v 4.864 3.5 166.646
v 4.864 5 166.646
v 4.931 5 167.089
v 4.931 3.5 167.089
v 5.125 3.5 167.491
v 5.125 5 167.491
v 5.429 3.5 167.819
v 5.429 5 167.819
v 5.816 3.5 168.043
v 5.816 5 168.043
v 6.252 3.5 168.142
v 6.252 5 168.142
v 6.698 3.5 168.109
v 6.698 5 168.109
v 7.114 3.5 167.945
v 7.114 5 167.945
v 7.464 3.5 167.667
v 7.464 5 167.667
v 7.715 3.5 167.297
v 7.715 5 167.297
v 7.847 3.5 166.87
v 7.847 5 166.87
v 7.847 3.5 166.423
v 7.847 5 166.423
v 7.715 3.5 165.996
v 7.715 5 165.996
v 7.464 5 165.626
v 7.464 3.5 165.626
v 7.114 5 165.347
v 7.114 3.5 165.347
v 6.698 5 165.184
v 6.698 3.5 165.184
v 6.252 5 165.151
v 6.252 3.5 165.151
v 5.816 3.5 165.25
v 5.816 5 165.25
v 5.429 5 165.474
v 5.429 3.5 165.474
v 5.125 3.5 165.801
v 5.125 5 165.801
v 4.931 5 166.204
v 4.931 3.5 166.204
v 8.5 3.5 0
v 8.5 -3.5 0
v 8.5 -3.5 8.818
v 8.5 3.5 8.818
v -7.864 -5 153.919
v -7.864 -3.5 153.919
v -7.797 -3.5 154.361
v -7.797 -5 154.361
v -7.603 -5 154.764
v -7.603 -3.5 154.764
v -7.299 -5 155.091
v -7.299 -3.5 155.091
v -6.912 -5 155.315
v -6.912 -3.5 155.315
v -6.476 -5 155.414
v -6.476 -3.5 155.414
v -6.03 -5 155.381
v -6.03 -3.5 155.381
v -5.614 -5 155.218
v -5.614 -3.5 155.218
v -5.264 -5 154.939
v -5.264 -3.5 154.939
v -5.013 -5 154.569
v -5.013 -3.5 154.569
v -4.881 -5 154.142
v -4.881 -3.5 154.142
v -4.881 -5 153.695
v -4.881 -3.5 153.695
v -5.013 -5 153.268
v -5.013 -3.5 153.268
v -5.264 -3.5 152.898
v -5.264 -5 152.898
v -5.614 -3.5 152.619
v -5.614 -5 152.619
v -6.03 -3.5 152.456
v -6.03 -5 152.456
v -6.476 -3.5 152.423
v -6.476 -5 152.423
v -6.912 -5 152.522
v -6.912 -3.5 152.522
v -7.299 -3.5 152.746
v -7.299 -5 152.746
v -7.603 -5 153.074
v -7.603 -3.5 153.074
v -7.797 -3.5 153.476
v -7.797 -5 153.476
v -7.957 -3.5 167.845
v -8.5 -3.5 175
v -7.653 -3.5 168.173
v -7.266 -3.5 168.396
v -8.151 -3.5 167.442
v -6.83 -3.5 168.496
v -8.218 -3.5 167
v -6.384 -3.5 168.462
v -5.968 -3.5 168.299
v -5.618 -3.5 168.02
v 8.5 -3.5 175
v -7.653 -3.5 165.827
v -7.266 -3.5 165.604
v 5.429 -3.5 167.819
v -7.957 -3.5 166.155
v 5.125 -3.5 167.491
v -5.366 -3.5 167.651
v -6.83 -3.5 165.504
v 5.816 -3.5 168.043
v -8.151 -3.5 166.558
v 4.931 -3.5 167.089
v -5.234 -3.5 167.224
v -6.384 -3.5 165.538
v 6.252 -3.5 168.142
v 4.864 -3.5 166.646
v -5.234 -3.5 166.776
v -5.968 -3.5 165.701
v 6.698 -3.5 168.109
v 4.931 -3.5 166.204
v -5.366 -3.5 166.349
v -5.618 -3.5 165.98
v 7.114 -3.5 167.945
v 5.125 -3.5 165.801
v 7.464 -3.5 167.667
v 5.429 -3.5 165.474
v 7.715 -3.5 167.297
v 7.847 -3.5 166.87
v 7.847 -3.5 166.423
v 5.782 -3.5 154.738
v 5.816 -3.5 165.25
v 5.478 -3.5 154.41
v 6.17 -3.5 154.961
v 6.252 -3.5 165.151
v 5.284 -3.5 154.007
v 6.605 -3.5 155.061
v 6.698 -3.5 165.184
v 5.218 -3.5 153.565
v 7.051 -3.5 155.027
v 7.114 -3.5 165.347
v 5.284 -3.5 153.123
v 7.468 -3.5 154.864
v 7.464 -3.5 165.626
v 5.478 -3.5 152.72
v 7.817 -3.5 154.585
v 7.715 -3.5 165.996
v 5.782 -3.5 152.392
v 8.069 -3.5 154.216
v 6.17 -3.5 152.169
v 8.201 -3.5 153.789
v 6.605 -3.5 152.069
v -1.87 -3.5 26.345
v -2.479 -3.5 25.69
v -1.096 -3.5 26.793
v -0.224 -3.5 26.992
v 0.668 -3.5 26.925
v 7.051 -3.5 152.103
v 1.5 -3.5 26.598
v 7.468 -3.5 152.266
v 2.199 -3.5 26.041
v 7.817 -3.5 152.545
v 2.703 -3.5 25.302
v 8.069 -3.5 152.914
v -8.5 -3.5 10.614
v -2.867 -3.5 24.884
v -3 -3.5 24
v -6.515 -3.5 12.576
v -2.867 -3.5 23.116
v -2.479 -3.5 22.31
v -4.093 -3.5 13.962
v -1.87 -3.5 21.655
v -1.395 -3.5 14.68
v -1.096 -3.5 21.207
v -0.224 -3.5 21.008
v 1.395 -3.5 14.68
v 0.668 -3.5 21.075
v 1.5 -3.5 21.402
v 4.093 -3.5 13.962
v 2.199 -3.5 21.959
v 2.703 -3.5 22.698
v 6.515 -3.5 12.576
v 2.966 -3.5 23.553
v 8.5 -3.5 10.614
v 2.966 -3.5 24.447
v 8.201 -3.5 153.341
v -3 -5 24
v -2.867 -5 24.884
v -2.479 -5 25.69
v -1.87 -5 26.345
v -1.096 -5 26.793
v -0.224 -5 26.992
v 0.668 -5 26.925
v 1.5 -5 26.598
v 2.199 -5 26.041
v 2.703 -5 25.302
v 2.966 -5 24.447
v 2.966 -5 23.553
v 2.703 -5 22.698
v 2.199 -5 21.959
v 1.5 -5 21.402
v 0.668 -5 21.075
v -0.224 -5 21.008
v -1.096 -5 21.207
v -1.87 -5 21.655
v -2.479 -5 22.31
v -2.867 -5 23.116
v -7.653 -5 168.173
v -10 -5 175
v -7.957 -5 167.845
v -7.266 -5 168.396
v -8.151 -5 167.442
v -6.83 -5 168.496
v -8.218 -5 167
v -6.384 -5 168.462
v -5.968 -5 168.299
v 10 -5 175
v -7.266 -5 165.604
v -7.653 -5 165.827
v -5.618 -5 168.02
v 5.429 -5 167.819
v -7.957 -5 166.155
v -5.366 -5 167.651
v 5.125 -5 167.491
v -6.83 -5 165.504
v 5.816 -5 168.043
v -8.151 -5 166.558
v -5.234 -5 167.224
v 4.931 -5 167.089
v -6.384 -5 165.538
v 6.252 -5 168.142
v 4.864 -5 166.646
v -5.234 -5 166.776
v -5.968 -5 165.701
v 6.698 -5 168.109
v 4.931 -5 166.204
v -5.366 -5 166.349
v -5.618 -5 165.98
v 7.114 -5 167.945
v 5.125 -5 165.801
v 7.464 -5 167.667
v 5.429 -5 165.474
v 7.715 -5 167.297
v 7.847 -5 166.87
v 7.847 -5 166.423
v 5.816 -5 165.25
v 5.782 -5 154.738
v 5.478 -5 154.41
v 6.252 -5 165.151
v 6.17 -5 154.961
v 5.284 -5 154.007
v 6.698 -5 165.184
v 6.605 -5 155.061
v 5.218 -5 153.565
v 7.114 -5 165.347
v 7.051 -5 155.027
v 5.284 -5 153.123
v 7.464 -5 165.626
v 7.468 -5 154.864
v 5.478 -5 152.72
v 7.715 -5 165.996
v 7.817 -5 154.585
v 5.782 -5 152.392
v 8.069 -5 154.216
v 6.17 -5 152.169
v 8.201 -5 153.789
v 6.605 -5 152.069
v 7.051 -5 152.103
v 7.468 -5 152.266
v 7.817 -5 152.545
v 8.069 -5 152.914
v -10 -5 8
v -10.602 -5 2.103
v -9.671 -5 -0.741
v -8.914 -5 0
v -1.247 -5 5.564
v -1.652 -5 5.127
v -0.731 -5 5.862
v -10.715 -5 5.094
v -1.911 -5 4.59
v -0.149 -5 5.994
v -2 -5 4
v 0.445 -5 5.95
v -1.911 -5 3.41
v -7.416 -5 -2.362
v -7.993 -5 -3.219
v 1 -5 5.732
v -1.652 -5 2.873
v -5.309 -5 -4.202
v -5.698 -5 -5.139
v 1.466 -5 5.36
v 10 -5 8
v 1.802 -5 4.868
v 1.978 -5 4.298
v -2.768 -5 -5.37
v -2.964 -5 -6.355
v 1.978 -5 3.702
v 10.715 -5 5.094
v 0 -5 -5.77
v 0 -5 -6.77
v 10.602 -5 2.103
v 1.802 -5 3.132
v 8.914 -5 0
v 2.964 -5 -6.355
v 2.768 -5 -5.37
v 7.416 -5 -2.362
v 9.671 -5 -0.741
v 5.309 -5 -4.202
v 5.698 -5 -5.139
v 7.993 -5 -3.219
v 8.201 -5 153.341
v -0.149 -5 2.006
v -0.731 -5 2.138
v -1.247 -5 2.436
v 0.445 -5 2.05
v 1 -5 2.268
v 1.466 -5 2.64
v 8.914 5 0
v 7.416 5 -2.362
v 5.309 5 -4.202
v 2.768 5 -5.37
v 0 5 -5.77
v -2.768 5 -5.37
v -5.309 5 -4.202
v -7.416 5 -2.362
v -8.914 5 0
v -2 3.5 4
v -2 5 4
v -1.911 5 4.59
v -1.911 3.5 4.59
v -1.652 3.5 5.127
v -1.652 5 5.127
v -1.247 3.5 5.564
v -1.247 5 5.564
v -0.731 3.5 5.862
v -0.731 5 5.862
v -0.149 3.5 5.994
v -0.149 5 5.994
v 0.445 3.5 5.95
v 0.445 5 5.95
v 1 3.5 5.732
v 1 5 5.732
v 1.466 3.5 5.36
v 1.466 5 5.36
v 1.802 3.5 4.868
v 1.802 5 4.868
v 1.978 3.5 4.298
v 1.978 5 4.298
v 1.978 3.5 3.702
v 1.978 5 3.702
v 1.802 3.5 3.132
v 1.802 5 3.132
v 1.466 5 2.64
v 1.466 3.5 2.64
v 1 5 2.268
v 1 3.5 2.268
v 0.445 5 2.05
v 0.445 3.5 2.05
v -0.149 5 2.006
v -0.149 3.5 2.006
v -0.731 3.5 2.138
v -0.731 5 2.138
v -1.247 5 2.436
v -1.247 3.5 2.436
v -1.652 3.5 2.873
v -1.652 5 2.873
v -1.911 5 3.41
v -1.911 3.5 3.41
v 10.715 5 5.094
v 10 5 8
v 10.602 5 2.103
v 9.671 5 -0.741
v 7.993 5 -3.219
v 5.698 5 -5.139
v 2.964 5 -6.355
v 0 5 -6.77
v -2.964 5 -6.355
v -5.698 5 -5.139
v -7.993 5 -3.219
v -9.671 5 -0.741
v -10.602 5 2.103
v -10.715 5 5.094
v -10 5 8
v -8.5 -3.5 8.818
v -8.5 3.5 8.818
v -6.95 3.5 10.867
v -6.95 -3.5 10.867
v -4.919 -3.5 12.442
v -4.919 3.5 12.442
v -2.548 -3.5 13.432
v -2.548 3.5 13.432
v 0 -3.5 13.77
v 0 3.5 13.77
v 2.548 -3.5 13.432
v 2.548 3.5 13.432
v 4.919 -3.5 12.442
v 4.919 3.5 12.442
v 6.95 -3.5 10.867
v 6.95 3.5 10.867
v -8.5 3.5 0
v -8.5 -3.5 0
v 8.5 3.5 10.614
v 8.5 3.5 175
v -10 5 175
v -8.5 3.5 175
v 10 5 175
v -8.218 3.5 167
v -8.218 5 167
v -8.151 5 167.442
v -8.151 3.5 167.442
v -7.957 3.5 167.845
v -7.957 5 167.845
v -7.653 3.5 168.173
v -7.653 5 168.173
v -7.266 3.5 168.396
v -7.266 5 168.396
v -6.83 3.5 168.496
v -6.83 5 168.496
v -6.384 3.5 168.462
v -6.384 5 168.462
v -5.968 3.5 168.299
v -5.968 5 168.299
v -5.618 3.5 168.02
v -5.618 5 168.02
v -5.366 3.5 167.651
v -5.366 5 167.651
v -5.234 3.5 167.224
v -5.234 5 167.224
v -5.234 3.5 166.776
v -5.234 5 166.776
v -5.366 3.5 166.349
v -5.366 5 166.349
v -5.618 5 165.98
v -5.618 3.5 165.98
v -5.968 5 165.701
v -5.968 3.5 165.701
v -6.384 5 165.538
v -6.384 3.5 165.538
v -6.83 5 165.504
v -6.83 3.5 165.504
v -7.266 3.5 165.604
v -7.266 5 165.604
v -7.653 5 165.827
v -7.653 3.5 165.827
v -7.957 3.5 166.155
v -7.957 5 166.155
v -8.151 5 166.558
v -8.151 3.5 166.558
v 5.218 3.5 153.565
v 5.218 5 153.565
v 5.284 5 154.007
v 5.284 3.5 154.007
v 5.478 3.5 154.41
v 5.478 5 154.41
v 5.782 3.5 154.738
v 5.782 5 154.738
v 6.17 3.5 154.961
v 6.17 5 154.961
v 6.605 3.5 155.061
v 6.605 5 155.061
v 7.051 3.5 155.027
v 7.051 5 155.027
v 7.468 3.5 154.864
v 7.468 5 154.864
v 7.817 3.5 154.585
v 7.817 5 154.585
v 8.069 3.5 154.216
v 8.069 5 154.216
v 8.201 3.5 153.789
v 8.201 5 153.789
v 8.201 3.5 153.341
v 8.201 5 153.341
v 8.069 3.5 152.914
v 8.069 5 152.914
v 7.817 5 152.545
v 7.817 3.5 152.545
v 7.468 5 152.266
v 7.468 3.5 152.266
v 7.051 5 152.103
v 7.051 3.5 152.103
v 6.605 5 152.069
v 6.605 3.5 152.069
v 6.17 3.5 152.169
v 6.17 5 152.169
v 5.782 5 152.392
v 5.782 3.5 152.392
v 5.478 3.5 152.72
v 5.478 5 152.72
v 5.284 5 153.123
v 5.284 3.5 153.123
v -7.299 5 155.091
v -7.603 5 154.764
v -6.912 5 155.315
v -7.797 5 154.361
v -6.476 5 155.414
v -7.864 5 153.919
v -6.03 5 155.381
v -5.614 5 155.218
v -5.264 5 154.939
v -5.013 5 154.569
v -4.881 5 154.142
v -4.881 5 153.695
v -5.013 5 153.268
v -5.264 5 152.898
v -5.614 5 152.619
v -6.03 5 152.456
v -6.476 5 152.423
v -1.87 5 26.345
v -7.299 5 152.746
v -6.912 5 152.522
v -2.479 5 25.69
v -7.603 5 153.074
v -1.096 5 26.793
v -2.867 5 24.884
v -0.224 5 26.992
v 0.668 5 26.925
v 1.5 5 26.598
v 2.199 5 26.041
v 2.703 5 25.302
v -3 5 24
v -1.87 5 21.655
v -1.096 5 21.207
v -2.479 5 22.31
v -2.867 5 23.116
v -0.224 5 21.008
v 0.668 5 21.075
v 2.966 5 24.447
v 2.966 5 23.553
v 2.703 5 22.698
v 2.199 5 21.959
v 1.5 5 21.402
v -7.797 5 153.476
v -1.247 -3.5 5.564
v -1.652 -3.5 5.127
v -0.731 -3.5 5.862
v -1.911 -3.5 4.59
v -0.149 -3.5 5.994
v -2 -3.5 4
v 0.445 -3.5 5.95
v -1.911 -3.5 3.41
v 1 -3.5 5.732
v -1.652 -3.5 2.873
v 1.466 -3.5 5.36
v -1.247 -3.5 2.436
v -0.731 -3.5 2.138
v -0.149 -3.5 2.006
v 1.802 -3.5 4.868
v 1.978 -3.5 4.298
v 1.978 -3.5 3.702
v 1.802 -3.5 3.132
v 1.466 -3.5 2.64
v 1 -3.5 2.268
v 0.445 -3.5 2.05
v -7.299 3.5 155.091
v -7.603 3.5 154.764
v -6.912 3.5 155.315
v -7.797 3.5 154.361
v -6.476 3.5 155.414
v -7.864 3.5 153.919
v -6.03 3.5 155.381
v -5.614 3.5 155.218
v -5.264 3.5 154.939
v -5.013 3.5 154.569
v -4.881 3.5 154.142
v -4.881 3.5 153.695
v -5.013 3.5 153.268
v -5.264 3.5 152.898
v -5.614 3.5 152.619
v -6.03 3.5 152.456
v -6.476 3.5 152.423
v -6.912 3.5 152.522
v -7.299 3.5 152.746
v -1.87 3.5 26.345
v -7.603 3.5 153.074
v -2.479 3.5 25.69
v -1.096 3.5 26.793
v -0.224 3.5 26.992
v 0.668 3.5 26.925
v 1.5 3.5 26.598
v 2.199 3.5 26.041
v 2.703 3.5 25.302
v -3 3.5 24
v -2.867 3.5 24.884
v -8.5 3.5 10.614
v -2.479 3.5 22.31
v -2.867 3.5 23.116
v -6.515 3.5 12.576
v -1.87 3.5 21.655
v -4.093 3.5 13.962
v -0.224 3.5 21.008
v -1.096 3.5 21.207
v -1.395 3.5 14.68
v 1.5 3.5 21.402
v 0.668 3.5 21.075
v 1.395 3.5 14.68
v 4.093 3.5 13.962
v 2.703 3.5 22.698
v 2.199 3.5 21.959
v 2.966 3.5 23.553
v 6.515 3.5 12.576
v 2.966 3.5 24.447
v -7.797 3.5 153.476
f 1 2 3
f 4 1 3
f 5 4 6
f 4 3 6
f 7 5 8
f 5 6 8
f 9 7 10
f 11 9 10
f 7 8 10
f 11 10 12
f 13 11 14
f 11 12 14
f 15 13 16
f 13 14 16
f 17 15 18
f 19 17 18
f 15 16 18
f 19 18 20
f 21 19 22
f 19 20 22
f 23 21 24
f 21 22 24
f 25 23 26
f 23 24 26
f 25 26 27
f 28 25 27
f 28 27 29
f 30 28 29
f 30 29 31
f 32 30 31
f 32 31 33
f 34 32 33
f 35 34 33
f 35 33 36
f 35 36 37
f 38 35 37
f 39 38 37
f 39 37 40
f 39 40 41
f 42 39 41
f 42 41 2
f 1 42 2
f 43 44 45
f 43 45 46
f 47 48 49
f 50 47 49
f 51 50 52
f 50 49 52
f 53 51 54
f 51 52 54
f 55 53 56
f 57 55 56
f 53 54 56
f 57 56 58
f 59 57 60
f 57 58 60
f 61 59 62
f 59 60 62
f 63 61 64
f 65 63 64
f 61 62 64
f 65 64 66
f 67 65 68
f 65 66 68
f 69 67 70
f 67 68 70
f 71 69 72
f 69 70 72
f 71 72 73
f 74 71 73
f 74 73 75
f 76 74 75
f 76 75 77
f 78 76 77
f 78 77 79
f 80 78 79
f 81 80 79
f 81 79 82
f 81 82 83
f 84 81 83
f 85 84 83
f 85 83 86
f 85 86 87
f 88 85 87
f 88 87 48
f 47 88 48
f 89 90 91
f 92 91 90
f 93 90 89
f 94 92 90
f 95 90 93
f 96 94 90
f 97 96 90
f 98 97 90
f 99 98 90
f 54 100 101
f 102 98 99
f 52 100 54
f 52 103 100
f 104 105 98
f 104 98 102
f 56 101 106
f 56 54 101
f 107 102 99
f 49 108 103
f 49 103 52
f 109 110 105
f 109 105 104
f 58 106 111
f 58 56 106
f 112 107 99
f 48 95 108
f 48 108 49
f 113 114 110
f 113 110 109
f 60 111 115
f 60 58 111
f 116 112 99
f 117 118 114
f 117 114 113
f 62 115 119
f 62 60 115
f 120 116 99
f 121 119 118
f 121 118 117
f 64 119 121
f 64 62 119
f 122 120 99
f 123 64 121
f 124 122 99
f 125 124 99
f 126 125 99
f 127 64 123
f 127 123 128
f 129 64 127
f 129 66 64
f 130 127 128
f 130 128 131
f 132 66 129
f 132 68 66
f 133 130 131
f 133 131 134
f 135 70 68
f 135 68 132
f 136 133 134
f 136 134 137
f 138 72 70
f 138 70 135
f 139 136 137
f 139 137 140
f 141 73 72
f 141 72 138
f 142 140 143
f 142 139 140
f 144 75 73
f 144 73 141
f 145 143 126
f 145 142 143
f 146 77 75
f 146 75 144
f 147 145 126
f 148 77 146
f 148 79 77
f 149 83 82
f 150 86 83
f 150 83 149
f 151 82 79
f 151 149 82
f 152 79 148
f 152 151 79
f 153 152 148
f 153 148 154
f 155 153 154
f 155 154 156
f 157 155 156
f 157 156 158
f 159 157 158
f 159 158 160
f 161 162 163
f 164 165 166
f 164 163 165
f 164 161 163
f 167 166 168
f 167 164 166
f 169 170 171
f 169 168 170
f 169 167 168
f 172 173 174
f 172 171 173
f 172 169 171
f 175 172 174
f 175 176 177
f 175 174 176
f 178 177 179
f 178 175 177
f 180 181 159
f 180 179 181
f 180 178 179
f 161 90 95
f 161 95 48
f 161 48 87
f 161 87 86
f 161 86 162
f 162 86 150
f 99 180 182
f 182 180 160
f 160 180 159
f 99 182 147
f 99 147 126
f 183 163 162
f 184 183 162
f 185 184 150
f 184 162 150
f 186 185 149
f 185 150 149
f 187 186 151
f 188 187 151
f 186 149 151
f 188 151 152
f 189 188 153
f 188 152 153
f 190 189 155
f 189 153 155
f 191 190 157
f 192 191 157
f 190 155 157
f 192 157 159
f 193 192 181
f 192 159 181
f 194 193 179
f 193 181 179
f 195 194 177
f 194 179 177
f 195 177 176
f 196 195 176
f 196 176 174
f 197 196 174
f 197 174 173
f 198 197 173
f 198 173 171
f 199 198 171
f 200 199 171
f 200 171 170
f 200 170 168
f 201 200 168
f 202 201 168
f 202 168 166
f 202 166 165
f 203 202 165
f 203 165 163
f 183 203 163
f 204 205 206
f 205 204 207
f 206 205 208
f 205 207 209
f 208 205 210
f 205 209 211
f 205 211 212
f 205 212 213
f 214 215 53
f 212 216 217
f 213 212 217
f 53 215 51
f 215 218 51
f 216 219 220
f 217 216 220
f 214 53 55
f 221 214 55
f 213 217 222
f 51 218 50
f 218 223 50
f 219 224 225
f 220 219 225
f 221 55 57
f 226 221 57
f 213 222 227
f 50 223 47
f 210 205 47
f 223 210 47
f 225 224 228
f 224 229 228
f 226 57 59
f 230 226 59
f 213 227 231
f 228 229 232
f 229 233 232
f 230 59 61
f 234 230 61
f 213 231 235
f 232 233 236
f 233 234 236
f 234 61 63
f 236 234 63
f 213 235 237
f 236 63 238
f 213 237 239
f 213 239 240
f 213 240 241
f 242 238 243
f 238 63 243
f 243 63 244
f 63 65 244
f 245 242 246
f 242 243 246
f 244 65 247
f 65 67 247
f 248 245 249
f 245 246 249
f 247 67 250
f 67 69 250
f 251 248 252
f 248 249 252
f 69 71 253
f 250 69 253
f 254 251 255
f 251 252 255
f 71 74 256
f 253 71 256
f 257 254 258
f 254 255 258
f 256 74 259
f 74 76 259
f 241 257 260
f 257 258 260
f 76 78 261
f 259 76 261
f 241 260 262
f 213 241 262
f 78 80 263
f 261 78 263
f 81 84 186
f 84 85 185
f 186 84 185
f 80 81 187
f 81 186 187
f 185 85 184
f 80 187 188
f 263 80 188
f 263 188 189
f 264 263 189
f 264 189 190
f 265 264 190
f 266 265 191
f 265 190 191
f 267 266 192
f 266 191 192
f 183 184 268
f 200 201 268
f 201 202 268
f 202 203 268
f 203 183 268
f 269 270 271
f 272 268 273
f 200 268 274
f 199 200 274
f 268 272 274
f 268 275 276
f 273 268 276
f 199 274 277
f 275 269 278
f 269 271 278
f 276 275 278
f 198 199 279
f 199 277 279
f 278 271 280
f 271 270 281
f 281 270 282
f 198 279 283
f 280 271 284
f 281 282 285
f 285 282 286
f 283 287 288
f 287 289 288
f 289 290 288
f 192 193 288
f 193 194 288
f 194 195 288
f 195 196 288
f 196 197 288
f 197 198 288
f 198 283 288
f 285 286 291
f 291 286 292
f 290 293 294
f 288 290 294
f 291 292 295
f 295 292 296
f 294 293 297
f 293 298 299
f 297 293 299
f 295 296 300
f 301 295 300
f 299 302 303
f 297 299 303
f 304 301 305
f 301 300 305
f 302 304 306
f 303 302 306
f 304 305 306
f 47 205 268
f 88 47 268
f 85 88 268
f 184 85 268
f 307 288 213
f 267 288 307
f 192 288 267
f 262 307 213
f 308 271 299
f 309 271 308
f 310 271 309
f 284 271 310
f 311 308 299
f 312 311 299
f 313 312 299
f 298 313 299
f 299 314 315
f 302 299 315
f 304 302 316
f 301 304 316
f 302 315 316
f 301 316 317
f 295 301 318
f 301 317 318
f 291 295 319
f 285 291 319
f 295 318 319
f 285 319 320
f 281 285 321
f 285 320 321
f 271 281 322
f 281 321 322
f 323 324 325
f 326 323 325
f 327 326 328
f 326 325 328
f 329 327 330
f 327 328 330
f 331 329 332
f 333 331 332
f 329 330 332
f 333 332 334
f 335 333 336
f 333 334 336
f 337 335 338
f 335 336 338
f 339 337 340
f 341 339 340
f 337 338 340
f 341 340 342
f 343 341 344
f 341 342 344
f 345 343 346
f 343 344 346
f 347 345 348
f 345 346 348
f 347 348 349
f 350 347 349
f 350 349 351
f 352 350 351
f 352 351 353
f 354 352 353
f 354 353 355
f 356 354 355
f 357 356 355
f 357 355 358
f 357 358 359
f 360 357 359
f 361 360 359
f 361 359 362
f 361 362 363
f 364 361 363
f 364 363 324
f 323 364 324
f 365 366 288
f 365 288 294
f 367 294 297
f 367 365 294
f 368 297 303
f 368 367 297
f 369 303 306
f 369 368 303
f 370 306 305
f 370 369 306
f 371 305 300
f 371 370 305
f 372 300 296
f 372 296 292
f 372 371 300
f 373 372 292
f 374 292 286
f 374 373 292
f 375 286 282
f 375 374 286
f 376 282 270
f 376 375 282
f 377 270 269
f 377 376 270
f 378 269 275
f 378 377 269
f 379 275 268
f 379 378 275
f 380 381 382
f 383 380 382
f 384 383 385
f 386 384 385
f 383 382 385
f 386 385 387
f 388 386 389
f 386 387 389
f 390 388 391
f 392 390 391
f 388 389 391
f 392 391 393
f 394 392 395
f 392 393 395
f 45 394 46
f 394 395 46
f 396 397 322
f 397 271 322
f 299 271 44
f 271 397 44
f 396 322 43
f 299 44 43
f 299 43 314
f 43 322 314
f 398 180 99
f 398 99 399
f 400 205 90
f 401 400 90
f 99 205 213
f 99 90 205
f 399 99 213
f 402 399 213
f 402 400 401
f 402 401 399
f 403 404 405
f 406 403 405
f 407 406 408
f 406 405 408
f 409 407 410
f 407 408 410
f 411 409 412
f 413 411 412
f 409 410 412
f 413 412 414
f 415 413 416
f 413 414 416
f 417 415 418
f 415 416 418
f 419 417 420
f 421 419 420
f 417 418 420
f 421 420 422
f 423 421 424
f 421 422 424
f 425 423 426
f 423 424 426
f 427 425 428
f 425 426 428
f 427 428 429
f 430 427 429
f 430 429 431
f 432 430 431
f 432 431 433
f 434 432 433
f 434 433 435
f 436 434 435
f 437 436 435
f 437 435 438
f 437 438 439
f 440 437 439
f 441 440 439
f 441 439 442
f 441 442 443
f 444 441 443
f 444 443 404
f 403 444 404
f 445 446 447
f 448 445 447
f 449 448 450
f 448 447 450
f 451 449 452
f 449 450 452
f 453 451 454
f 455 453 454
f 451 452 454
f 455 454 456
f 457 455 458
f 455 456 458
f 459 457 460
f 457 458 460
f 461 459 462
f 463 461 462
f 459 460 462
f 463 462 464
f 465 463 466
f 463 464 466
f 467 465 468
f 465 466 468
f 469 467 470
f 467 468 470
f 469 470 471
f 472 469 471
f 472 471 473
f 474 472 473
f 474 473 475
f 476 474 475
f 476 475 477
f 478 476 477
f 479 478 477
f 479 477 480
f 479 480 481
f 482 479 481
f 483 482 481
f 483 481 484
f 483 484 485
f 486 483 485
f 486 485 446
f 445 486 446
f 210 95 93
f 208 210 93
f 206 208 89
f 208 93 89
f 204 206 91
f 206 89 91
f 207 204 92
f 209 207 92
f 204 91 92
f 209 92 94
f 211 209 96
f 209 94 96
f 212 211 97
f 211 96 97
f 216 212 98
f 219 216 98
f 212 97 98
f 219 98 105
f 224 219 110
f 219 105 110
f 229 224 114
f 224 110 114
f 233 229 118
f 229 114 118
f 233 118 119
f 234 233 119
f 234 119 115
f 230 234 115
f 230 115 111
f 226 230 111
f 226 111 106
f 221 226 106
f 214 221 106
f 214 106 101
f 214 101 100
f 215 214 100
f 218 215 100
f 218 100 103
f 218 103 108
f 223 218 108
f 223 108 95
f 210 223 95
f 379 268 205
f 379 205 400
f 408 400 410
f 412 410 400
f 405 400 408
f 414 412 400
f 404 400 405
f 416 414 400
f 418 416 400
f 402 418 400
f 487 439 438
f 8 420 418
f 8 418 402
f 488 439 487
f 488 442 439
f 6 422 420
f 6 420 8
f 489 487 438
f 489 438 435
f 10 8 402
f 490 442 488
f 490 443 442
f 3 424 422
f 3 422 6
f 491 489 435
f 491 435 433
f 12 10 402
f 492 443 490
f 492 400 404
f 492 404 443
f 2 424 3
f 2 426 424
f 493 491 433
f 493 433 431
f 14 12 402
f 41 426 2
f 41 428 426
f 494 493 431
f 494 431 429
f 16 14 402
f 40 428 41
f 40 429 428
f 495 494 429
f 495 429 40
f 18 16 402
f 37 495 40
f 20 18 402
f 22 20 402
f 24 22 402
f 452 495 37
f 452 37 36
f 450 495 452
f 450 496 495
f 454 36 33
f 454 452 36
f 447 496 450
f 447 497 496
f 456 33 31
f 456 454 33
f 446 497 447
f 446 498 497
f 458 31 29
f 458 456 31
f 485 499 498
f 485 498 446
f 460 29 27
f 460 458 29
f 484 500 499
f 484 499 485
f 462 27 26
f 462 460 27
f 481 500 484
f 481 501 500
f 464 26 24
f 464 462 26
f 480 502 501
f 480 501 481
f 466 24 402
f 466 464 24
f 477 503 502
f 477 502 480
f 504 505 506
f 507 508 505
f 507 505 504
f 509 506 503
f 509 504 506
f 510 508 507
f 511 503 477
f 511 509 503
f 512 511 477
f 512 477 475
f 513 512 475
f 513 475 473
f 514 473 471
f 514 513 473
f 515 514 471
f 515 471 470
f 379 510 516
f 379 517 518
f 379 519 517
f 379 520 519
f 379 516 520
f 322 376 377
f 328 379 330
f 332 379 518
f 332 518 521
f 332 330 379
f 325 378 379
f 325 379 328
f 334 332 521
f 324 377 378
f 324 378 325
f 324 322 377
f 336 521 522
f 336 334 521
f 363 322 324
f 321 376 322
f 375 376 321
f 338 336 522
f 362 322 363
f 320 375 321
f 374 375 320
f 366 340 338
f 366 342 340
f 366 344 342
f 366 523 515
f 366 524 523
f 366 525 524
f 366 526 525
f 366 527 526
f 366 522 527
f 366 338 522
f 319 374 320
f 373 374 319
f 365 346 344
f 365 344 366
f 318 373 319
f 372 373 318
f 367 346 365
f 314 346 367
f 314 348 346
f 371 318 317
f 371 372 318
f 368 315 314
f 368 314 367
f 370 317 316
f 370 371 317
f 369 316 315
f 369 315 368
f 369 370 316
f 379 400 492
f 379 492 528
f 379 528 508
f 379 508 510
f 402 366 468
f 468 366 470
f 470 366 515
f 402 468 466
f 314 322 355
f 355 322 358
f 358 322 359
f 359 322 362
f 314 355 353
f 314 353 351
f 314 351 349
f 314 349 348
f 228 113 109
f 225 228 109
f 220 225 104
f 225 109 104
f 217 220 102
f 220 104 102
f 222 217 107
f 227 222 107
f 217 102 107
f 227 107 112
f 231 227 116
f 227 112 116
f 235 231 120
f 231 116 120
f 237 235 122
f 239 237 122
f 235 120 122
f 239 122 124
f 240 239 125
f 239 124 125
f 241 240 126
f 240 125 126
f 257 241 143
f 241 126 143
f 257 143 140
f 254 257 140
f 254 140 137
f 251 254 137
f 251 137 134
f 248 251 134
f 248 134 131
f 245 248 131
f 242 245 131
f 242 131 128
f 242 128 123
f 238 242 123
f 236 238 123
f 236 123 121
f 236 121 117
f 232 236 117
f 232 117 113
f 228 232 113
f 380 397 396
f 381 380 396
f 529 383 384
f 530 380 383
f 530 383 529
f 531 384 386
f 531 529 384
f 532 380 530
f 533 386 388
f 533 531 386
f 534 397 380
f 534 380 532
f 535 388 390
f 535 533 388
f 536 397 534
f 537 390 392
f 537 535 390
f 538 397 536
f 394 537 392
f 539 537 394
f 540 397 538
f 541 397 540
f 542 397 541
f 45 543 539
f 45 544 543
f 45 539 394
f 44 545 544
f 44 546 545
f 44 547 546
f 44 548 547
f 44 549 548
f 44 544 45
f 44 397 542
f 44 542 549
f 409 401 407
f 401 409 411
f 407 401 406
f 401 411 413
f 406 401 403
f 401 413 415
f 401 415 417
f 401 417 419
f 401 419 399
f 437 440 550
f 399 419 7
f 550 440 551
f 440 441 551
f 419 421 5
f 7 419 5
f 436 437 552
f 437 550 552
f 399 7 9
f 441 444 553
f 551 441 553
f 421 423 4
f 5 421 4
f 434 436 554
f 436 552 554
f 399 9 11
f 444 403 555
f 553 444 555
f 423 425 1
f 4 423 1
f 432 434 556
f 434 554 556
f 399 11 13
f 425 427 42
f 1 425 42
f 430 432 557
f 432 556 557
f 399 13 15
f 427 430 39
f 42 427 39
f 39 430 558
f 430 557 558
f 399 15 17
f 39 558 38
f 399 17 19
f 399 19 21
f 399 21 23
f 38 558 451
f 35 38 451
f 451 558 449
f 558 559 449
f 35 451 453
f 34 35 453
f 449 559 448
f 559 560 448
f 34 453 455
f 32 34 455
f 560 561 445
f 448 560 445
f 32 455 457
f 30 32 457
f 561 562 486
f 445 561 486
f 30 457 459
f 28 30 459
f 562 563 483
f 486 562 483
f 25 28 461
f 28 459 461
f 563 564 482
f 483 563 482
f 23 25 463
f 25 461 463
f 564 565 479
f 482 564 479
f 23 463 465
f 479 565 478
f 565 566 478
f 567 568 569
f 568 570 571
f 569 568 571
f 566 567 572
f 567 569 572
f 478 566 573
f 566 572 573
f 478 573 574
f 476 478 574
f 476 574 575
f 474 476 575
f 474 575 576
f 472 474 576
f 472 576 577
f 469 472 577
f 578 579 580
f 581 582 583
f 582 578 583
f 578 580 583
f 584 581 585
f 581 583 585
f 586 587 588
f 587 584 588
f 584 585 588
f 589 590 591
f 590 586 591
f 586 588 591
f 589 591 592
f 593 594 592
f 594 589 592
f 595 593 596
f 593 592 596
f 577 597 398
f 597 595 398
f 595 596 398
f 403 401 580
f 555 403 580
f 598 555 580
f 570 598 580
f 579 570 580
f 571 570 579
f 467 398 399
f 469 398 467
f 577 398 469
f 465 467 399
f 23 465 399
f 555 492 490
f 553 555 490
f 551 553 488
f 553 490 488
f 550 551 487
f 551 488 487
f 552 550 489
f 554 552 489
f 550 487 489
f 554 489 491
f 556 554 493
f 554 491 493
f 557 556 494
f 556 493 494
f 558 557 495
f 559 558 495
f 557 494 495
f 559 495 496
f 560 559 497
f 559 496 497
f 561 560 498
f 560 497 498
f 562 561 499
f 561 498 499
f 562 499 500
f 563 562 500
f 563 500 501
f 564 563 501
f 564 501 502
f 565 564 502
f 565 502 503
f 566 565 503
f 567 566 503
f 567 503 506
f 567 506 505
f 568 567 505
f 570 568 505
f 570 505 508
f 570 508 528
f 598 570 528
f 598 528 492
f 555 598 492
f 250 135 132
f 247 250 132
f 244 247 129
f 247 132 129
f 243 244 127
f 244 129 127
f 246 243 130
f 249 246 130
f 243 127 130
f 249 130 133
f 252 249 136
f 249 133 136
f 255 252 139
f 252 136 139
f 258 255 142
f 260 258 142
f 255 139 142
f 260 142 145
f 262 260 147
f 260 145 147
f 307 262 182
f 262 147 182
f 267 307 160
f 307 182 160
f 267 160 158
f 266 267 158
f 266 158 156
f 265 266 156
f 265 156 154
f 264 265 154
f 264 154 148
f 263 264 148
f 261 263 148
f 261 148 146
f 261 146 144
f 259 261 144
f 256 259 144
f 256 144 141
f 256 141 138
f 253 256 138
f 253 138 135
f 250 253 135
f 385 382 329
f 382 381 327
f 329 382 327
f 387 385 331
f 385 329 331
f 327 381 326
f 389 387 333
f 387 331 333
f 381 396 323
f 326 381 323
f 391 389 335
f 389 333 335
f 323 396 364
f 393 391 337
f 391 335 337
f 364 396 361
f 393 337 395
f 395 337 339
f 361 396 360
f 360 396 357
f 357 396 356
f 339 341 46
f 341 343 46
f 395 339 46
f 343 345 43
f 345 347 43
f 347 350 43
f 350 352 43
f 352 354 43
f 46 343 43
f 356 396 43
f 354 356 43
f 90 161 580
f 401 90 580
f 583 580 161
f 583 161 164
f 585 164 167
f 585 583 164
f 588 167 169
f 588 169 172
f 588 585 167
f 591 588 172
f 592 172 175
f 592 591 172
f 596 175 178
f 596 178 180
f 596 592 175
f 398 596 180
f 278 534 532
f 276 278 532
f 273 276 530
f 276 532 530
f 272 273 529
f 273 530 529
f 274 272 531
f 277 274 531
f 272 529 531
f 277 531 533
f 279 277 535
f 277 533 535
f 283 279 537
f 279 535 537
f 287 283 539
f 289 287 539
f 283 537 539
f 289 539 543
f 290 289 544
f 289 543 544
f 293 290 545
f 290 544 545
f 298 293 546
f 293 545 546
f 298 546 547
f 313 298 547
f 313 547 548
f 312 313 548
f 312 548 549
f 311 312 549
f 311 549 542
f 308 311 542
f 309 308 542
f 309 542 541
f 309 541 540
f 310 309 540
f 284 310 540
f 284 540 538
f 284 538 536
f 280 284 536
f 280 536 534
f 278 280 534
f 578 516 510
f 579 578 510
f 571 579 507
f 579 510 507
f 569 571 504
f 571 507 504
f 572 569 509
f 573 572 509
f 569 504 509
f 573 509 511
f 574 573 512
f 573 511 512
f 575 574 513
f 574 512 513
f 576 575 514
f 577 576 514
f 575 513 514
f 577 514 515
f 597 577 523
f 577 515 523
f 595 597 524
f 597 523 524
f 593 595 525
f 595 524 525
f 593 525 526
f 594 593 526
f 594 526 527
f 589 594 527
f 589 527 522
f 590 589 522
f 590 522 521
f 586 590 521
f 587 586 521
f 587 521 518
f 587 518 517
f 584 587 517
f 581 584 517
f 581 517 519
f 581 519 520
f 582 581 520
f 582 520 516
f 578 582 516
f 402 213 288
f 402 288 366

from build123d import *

# Parameters (mm, degrees)
SKETCH1_W           = 20
SKETCH1_H           = 10
SKETCH1_W_2         = 17
SKETCH1_H_2         = 7
BOSS_EXTRUDE1_DEPTH = 175
SKETCH2_R           = 1.5
CUT_EXTRUDE1_DEPTH  = 176.570498661
SKETCH3_R           = 2
SKETCH3_R_2         = 3
CUT_EXTRUDE2_DEPTH  = 176.570498661
SKETCH5_R           = 10.770329614
SKETCH5_R_2         = 9.770329614
BOSS_EXTRUDE2_DEPTH = 10


with BuildPart() as part:
    # Sketch1 → Boss-Extrude1 (new body)
    with BuildSketch(Plane.XY):
        Rectangle(SKETCH1_W, SKETCH1_H)
        Rectangle(SKETCH1_W_2, SKETCH1_H_2, mode=Mode.SUBTRACT)
    extrude(amount=BOSS_EXTRUDE1_DEPTH)

    # Sketch2 → Cut-Extrude1 (cut, through all)
    with BuildSketch(Plane(origin=(0, 5, 0), x_dir=(1, 0, 0), z_dir=(0, 1, 0))):
        with Locations((6.363961031, -166.646446609)):
            Circle(SKETCH2_R)
        with Locations((-6.717514421, -167)):
            Circle(SKETCH2_R)
        with Locations((6.717514421, -153.564971157)):
            Circle(SKETCH2_R)
        with Locations((-6.363961031, -153.918524548)):
            Circle(SKETCH2_R)
    extrude(amount=-CUT_EXTRUDE1_DEPTH, mode=Mode.SUBTRACT)

    # Sketch3 → Cut-Extrude2 (cut, through all)
    with BuildSketch(Plane(origin=(0, 5, 0), x_dir=(1, 0, 0), z_dir=(0, 1, 0))):
        with Locations((0, -4)):
            Circle(SKETCH3_R)
        with Locations((0, -24)):
            Circle(SKETCH3_R_2)
    extrude(amount=-CUT_EXTRUDE2_DEPTH, mode=Mode.SUBTRACT)

    # Sketch5 → Boss-Extrude2 (add)
    with BuildSketch(Plane(origin=(0, 5, 0), x_dir=(1, 0, 0), z_dir=(0, 1, 0))):
        with Locations((0, -4)):
            Circle(SKETCH5_R)
        with Locations((0, -4)):
            Circle(SKETCH5_R_2, mode=Mode.SUBTRACT)
    extrude(amount=-BOSS_EXTRUDE2_DEPTH)


solid = part.part
